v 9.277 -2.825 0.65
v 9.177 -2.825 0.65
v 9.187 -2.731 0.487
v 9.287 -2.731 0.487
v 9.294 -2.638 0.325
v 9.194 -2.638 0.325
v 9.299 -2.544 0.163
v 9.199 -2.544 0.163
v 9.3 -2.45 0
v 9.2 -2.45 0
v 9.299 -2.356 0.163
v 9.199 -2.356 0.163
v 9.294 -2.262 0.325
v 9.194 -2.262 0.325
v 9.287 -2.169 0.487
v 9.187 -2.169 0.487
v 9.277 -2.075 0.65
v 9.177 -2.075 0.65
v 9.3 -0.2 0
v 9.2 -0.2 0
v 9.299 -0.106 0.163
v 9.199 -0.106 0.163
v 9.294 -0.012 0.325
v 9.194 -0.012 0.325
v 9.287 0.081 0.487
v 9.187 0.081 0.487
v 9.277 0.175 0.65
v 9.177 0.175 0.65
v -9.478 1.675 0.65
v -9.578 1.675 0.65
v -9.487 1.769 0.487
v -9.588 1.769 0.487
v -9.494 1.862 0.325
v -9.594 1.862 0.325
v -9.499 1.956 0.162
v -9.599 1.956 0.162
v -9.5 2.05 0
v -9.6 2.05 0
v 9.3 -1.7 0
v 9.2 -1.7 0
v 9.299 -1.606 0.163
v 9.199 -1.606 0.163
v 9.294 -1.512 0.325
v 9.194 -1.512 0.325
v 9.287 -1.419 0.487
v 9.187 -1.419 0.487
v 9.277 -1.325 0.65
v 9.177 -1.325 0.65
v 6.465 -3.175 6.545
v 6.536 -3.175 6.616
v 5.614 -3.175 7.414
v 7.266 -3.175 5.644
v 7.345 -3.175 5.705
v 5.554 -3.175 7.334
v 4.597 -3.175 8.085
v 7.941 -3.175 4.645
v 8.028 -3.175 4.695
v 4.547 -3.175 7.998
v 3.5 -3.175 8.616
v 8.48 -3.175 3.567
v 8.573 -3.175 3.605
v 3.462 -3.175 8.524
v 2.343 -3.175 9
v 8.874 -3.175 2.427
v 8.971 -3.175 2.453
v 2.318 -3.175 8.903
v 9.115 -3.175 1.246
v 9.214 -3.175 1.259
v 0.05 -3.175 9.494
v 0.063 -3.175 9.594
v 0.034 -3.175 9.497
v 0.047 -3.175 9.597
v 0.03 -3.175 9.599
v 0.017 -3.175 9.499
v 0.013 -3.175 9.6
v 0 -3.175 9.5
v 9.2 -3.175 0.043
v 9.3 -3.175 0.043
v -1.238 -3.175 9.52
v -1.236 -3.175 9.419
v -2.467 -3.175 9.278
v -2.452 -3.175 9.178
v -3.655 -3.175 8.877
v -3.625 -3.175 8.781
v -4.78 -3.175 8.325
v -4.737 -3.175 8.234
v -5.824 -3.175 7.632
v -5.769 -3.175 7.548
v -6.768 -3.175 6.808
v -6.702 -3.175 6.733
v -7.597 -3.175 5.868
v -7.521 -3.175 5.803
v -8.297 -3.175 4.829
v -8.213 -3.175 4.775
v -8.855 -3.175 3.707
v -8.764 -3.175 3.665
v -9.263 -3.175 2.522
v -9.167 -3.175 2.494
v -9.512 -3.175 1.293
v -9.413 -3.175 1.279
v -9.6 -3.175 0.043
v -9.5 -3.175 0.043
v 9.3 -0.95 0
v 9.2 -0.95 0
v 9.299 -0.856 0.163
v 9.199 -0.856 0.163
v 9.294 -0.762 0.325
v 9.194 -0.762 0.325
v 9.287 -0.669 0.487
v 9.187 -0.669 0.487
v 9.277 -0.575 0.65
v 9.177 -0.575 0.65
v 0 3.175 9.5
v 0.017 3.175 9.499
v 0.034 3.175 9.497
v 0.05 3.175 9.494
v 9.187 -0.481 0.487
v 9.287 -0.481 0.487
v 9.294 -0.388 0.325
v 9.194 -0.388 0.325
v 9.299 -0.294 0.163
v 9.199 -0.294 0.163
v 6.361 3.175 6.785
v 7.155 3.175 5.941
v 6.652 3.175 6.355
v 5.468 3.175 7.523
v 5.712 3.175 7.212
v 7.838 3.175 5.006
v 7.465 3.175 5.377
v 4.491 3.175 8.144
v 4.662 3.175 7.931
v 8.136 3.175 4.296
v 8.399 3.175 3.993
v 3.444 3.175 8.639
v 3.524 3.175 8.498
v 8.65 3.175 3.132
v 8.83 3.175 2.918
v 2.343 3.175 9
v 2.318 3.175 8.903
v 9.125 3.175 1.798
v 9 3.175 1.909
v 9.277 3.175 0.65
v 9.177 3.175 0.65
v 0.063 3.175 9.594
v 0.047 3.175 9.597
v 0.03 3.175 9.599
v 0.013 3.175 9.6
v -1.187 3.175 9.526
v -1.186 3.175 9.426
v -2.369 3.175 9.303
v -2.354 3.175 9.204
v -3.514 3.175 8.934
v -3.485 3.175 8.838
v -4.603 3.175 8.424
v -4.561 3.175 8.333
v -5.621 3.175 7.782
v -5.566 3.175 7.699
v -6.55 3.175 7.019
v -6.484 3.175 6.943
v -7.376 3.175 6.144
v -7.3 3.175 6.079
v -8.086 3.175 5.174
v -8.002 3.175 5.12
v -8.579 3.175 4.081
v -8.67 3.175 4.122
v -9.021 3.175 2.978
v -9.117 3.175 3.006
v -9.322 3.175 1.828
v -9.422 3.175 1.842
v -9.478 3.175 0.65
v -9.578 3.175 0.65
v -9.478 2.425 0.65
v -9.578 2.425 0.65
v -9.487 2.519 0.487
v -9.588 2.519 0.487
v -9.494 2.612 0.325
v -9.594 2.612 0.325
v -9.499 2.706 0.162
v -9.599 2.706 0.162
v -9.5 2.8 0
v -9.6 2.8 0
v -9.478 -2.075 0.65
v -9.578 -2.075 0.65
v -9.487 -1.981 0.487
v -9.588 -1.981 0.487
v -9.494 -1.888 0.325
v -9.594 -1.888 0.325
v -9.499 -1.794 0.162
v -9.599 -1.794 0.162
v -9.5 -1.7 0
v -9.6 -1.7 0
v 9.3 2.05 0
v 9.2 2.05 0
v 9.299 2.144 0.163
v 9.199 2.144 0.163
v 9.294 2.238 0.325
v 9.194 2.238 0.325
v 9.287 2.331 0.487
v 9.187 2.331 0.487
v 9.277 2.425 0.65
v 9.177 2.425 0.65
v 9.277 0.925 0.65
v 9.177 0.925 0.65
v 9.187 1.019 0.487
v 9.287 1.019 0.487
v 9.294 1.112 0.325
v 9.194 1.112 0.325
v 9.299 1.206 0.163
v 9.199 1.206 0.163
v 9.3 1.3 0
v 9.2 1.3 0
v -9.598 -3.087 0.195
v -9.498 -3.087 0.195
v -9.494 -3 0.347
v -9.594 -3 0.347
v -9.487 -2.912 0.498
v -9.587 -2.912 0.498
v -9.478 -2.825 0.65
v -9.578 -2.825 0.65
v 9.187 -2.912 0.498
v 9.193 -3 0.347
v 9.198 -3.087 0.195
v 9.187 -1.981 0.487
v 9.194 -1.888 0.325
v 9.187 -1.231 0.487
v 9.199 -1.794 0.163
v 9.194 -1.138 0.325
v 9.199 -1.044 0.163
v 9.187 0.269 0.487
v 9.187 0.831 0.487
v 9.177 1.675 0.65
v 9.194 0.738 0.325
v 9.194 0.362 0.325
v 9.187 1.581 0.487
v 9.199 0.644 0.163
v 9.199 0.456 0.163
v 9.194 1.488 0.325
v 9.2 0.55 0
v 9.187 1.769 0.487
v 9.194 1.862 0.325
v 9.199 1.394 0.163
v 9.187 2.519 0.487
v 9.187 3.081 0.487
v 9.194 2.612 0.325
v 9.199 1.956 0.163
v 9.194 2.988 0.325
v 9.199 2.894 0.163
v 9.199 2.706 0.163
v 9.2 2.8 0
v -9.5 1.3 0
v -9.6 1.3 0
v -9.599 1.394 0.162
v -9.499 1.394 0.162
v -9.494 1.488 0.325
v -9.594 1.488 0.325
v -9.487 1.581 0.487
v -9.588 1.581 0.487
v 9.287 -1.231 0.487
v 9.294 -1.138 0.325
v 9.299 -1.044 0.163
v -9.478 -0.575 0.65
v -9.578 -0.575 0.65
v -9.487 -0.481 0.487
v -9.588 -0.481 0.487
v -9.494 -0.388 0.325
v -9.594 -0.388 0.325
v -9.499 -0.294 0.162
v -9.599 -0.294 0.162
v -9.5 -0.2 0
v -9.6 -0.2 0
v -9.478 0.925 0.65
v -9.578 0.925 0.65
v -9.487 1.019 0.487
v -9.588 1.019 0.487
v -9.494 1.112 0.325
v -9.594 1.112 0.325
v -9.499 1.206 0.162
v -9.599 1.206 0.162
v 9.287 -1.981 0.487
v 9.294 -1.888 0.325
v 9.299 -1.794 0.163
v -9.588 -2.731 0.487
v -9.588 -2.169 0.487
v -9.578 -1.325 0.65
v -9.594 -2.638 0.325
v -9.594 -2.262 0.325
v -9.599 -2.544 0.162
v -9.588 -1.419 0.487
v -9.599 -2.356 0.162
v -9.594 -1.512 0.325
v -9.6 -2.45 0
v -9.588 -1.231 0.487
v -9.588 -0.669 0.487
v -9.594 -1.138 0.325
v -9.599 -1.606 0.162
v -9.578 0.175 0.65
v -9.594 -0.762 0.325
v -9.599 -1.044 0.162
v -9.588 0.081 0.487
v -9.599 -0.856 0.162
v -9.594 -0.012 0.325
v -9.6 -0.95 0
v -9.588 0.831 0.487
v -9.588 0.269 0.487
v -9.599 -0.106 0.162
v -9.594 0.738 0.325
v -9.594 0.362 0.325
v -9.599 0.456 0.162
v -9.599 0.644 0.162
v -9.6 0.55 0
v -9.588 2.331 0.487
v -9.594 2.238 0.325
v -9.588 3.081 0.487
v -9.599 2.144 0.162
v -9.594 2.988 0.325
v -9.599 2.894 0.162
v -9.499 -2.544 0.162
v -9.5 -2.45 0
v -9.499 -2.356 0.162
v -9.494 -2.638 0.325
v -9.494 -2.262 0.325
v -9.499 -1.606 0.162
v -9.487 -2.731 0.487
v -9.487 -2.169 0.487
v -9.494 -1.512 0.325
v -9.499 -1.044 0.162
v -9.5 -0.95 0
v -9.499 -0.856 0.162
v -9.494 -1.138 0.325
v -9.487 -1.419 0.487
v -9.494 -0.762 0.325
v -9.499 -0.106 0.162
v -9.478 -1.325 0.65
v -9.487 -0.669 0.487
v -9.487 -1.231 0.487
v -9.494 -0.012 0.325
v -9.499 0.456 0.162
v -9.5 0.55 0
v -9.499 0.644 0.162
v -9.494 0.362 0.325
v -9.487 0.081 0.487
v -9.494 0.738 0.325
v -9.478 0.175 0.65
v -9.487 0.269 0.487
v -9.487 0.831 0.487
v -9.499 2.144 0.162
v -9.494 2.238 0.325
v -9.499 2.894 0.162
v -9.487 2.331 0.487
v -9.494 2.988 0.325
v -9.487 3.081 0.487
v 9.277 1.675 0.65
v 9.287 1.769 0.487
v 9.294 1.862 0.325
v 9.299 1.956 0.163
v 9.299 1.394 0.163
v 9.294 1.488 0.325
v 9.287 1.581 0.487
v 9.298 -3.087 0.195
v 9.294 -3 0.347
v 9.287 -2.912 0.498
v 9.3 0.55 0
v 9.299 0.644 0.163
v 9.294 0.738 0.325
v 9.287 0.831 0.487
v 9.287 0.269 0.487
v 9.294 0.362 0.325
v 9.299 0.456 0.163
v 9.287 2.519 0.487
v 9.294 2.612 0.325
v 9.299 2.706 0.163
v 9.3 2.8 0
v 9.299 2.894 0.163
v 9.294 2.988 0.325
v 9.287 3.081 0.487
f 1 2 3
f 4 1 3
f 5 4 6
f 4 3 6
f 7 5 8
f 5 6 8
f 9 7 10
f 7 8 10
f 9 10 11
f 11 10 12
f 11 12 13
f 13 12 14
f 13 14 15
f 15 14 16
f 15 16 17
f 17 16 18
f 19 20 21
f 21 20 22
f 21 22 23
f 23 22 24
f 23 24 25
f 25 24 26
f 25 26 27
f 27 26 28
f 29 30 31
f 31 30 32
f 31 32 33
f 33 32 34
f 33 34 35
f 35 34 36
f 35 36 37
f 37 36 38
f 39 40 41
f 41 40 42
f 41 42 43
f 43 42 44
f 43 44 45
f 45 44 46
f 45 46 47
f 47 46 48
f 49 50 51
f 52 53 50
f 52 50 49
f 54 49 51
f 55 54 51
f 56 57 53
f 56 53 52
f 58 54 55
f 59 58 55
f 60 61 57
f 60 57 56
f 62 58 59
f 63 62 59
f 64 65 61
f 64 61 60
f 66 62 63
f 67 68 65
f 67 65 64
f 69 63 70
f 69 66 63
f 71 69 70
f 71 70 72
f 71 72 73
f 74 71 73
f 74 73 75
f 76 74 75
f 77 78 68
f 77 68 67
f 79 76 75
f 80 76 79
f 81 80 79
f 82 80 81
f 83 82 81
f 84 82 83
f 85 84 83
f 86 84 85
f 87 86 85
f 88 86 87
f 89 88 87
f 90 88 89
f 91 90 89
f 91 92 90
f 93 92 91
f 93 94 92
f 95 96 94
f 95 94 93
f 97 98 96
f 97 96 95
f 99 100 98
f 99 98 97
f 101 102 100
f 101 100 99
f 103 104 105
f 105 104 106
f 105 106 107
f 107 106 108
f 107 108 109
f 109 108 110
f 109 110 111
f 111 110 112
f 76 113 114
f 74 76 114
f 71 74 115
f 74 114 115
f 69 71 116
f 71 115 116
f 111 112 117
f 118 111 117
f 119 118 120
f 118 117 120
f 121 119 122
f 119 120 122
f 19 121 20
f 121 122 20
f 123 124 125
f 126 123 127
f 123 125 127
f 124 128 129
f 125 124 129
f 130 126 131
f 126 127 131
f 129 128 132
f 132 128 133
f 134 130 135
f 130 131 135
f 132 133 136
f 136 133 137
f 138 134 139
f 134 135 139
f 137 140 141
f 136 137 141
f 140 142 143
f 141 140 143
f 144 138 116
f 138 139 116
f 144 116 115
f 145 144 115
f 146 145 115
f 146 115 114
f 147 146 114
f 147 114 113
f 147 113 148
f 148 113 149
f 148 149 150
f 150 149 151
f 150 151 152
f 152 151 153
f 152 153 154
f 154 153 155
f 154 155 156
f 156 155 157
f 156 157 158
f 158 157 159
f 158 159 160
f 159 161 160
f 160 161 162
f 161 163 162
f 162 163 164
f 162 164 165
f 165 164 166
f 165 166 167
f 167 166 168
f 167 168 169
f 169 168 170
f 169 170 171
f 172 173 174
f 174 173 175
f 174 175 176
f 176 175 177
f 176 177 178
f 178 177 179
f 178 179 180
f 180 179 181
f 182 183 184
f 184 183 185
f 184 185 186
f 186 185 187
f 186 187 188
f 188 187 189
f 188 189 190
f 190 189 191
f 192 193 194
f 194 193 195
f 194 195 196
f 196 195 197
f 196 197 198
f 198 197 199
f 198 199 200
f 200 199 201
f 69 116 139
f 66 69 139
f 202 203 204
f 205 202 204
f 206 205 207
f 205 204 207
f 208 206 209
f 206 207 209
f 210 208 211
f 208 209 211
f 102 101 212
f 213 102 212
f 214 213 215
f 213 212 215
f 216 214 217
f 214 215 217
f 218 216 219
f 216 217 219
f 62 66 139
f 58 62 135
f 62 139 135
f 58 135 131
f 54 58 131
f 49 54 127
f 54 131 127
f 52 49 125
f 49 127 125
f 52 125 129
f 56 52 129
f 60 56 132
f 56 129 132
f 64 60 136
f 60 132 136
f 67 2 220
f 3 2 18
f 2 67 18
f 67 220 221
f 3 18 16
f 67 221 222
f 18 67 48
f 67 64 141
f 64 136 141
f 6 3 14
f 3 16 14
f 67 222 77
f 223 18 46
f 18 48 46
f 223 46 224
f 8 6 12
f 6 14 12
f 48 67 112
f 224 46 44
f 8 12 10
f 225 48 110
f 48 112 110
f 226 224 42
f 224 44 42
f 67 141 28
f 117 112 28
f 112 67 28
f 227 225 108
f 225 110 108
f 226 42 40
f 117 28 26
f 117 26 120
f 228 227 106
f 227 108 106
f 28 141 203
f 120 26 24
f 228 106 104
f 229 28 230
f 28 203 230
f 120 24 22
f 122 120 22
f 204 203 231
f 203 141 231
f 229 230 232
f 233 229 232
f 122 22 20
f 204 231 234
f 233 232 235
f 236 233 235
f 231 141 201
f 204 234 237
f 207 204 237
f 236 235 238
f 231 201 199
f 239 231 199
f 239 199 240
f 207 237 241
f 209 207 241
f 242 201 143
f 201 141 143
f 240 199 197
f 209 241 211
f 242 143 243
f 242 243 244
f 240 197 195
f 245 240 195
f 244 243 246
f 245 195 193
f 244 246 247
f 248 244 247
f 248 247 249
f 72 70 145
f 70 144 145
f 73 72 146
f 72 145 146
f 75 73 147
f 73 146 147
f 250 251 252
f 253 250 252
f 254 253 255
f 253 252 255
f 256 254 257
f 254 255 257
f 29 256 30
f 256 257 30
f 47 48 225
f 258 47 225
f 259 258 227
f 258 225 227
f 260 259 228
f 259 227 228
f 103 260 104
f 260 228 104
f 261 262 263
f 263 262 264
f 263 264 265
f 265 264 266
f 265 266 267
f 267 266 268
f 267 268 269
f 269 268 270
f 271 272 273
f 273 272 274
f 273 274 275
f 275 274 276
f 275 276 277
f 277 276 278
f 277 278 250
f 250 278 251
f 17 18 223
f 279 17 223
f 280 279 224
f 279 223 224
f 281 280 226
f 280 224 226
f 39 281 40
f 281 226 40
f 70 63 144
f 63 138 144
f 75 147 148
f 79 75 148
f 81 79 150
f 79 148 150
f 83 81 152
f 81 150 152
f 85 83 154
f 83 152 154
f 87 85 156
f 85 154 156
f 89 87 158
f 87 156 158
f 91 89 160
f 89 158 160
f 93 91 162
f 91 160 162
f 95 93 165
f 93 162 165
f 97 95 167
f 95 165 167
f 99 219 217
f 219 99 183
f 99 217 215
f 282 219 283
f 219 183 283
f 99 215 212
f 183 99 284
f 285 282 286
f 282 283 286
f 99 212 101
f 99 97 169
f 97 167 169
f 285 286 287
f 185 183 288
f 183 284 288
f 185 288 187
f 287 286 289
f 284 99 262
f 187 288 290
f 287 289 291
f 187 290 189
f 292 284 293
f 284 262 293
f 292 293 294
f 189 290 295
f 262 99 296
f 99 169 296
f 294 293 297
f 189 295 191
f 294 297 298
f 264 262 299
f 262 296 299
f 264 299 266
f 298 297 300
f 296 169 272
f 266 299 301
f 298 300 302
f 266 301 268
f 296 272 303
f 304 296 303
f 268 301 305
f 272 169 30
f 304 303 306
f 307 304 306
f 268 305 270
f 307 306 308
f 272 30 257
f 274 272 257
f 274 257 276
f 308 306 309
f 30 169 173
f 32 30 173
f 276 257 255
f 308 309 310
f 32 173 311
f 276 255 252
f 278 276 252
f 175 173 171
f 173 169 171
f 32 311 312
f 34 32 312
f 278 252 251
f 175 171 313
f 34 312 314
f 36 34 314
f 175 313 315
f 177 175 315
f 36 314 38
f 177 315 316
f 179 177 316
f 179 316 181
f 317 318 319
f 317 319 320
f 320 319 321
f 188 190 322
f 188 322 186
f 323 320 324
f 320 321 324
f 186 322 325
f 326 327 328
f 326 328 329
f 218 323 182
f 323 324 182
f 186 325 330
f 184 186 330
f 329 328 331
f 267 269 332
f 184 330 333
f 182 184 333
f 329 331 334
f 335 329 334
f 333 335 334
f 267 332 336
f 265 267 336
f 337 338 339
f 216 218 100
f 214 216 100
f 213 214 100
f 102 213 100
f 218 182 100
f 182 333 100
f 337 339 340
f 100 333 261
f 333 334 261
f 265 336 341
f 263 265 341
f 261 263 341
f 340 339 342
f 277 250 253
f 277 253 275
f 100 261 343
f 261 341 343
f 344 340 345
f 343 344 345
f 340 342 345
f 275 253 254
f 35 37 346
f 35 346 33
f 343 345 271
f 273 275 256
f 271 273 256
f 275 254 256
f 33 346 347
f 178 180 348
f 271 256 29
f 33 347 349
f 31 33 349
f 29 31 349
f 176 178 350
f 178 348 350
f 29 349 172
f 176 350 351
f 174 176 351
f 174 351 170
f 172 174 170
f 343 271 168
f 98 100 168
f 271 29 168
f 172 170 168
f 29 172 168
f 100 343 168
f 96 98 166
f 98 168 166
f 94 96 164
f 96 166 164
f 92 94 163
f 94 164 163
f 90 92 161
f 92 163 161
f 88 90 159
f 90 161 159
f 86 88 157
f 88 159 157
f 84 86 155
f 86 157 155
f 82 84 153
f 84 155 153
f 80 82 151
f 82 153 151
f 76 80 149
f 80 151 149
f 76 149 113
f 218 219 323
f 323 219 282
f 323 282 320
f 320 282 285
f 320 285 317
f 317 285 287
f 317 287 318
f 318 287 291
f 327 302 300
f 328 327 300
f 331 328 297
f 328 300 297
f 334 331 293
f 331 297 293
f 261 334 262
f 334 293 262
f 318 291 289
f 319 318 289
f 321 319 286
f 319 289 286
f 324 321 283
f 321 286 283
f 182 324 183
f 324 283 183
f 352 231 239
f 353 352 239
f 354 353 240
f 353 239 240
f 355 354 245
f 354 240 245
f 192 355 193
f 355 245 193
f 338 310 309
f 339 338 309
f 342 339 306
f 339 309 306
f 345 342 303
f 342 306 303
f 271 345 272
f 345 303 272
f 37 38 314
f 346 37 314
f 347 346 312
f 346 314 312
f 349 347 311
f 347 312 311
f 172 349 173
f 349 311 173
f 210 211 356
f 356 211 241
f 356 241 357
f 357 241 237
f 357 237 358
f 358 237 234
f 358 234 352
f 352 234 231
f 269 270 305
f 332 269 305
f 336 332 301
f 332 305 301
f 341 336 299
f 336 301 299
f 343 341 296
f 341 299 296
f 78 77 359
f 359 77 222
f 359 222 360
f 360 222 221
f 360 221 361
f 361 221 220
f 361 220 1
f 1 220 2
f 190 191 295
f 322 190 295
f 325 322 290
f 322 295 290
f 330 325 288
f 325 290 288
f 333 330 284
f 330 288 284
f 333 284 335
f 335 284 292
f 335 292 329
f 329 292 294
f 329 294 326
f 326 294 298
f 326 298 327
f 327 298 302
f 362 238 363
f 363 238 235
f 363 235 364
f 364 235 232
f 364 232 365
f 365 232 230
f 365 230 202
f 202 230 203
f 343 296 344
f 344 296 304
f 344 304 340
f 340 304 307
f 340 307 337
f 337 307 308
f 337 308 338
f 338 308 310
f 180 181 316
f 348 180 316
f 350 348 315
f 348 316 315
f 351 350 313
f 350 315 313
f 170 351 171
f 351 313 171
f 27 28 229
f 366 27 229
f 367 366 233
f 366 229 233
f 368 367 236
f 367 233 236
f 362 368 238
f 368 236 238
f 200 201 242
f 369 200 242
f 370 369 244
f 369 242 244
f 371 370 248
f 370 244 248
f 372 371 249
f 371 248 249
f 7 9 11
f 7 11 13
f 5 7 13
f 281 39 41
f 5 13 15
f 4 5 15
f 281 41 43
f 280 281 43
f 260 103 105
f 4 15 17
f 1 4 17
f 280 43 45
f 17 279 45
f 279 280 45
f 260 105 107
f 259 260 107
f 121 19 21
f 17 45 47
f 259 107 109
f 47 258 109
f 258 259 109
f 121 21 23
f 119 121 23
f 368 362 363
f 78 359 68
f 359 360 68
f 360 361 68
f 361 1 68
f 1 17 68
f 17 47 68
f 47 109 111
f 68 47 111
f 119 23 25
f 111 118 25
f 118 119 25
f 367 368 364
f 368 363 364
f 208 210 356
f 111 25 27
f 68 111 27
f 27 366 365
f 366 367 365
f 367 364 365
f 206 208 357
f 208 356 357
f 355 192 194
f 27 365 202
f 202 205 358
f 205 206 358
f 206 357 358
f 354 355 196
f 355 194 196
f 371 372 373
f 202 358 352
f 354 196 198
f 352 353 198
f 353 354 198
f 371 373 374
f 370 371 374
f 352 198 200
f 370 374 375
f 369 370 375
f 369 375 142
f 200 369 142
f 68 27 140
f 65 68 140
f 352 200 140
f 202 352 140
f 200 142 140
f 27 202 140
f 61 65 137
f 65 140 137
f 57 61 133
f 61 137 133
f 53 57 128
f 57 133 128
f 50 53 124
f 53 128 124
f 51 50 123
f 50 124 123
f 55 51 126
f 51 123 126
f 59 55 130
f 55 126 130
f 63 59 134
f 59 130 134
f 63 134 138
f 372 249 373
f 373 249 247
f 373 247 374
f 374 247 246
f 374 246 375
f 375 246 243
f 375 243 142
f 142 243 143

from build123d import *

# Parameters (mm, degrees)
BOSS_EXTRUDE1_DEPTH     = 3.175
CUT_EXTRUDE1_DEPTH      = 14.942762459
CUT_EXTRUDE1_DEPTH_BACK = 14.942762459


with BuildPart() as part:
    # Sketch1 → Boss-Extrude1 (new, symmetric)
    with BuildSketch(Plane(origin=(0, 0, 0), x_dir=(1, 0, 0), z_dir=(0, 1, 0))):
        with BuildLine():
            Line((0.050388708, -9.493548387), (2.317880549, -8.903225806))
            ThreePointArc((2.317880549, -8.903225806), (7.278890748, -5.62652197), (9.2, 0))
            Line((9.2, 0), (9.3, 0))
            ThreePointArc((9.3, 0), (7.358009126, -5.687679817), (2.343074903, -9))
            Line((2.343074903, -9), (0.063226066, -9.593539621))
            ThreePointArc((0.063226066, -9.593539621), (0.03837284, -9.598354384), (0.013110494, -9.599991048))
            ThreePointArc((0.013110494, -9.599991048), (-6.783588256, -6.792858777), (-9.6, 0))
            Line((-9.6, 0), (-9.5, 0))
            ThreePointArc((-9.5, 0), (-6.717514421, -6.717514421), (0, -9.5))
            ThreePointArc((0, -9.5), (0.025400025, -9.49838054), (0.050388708, -9.493548387))
        make_face()
    extrude(amount=BOSS_EXTRUDE1_DEPTH, both=True)

    # Sketch2 → Cut-Extrude1 (cut, two sides: drawn at the far end of the back side and taken through both)
    with BuildSketch(Plane(origin=(0, 0, 0), x_dir=(0, 0, -1), z_dir=(1, 0, 0)).offset(-CUT_EXTRUDE1_DEPTH_BACK)):
        Polygon((0, 3.55), (0, 2.8), (-0.649519053, 3.175), align=None)
        Polygon((0, 2.8), (0, 2.05), (-0.649519053, 2.425), align=None)
        Polygon((0, 2.05), (0, 1.3), (-0.649519053, 1.675), align=None)
        Polygon((0, 1.3), (0, 0.55), (-0.649519053, 0.925), align=None)
        Polygon((0, 0.55), (0, -0.2), (-0.649519053, 0.175), align=None)
        Polygon((0, -0.2), (0, -0.95), (-0.649519053, -0.575), align=None)
        Polygon((0, -0.95), (0, -1.7), (-0.649519053, -1.325), align=None)
        Polygon((0, -1.7), (0, -2.45), (-0.649519053, -2.075), align=None)
        Polygon((0, -2.45), (0, -3.2), (-0.649519053, -2.825), align=None)
    extrude(amount=CUT_EXTRUDE1_DEPTH + CUT_EXTRUDE1_DEPTH_BACK, mode=Mode.SUBTRACT)


solid = part.part
